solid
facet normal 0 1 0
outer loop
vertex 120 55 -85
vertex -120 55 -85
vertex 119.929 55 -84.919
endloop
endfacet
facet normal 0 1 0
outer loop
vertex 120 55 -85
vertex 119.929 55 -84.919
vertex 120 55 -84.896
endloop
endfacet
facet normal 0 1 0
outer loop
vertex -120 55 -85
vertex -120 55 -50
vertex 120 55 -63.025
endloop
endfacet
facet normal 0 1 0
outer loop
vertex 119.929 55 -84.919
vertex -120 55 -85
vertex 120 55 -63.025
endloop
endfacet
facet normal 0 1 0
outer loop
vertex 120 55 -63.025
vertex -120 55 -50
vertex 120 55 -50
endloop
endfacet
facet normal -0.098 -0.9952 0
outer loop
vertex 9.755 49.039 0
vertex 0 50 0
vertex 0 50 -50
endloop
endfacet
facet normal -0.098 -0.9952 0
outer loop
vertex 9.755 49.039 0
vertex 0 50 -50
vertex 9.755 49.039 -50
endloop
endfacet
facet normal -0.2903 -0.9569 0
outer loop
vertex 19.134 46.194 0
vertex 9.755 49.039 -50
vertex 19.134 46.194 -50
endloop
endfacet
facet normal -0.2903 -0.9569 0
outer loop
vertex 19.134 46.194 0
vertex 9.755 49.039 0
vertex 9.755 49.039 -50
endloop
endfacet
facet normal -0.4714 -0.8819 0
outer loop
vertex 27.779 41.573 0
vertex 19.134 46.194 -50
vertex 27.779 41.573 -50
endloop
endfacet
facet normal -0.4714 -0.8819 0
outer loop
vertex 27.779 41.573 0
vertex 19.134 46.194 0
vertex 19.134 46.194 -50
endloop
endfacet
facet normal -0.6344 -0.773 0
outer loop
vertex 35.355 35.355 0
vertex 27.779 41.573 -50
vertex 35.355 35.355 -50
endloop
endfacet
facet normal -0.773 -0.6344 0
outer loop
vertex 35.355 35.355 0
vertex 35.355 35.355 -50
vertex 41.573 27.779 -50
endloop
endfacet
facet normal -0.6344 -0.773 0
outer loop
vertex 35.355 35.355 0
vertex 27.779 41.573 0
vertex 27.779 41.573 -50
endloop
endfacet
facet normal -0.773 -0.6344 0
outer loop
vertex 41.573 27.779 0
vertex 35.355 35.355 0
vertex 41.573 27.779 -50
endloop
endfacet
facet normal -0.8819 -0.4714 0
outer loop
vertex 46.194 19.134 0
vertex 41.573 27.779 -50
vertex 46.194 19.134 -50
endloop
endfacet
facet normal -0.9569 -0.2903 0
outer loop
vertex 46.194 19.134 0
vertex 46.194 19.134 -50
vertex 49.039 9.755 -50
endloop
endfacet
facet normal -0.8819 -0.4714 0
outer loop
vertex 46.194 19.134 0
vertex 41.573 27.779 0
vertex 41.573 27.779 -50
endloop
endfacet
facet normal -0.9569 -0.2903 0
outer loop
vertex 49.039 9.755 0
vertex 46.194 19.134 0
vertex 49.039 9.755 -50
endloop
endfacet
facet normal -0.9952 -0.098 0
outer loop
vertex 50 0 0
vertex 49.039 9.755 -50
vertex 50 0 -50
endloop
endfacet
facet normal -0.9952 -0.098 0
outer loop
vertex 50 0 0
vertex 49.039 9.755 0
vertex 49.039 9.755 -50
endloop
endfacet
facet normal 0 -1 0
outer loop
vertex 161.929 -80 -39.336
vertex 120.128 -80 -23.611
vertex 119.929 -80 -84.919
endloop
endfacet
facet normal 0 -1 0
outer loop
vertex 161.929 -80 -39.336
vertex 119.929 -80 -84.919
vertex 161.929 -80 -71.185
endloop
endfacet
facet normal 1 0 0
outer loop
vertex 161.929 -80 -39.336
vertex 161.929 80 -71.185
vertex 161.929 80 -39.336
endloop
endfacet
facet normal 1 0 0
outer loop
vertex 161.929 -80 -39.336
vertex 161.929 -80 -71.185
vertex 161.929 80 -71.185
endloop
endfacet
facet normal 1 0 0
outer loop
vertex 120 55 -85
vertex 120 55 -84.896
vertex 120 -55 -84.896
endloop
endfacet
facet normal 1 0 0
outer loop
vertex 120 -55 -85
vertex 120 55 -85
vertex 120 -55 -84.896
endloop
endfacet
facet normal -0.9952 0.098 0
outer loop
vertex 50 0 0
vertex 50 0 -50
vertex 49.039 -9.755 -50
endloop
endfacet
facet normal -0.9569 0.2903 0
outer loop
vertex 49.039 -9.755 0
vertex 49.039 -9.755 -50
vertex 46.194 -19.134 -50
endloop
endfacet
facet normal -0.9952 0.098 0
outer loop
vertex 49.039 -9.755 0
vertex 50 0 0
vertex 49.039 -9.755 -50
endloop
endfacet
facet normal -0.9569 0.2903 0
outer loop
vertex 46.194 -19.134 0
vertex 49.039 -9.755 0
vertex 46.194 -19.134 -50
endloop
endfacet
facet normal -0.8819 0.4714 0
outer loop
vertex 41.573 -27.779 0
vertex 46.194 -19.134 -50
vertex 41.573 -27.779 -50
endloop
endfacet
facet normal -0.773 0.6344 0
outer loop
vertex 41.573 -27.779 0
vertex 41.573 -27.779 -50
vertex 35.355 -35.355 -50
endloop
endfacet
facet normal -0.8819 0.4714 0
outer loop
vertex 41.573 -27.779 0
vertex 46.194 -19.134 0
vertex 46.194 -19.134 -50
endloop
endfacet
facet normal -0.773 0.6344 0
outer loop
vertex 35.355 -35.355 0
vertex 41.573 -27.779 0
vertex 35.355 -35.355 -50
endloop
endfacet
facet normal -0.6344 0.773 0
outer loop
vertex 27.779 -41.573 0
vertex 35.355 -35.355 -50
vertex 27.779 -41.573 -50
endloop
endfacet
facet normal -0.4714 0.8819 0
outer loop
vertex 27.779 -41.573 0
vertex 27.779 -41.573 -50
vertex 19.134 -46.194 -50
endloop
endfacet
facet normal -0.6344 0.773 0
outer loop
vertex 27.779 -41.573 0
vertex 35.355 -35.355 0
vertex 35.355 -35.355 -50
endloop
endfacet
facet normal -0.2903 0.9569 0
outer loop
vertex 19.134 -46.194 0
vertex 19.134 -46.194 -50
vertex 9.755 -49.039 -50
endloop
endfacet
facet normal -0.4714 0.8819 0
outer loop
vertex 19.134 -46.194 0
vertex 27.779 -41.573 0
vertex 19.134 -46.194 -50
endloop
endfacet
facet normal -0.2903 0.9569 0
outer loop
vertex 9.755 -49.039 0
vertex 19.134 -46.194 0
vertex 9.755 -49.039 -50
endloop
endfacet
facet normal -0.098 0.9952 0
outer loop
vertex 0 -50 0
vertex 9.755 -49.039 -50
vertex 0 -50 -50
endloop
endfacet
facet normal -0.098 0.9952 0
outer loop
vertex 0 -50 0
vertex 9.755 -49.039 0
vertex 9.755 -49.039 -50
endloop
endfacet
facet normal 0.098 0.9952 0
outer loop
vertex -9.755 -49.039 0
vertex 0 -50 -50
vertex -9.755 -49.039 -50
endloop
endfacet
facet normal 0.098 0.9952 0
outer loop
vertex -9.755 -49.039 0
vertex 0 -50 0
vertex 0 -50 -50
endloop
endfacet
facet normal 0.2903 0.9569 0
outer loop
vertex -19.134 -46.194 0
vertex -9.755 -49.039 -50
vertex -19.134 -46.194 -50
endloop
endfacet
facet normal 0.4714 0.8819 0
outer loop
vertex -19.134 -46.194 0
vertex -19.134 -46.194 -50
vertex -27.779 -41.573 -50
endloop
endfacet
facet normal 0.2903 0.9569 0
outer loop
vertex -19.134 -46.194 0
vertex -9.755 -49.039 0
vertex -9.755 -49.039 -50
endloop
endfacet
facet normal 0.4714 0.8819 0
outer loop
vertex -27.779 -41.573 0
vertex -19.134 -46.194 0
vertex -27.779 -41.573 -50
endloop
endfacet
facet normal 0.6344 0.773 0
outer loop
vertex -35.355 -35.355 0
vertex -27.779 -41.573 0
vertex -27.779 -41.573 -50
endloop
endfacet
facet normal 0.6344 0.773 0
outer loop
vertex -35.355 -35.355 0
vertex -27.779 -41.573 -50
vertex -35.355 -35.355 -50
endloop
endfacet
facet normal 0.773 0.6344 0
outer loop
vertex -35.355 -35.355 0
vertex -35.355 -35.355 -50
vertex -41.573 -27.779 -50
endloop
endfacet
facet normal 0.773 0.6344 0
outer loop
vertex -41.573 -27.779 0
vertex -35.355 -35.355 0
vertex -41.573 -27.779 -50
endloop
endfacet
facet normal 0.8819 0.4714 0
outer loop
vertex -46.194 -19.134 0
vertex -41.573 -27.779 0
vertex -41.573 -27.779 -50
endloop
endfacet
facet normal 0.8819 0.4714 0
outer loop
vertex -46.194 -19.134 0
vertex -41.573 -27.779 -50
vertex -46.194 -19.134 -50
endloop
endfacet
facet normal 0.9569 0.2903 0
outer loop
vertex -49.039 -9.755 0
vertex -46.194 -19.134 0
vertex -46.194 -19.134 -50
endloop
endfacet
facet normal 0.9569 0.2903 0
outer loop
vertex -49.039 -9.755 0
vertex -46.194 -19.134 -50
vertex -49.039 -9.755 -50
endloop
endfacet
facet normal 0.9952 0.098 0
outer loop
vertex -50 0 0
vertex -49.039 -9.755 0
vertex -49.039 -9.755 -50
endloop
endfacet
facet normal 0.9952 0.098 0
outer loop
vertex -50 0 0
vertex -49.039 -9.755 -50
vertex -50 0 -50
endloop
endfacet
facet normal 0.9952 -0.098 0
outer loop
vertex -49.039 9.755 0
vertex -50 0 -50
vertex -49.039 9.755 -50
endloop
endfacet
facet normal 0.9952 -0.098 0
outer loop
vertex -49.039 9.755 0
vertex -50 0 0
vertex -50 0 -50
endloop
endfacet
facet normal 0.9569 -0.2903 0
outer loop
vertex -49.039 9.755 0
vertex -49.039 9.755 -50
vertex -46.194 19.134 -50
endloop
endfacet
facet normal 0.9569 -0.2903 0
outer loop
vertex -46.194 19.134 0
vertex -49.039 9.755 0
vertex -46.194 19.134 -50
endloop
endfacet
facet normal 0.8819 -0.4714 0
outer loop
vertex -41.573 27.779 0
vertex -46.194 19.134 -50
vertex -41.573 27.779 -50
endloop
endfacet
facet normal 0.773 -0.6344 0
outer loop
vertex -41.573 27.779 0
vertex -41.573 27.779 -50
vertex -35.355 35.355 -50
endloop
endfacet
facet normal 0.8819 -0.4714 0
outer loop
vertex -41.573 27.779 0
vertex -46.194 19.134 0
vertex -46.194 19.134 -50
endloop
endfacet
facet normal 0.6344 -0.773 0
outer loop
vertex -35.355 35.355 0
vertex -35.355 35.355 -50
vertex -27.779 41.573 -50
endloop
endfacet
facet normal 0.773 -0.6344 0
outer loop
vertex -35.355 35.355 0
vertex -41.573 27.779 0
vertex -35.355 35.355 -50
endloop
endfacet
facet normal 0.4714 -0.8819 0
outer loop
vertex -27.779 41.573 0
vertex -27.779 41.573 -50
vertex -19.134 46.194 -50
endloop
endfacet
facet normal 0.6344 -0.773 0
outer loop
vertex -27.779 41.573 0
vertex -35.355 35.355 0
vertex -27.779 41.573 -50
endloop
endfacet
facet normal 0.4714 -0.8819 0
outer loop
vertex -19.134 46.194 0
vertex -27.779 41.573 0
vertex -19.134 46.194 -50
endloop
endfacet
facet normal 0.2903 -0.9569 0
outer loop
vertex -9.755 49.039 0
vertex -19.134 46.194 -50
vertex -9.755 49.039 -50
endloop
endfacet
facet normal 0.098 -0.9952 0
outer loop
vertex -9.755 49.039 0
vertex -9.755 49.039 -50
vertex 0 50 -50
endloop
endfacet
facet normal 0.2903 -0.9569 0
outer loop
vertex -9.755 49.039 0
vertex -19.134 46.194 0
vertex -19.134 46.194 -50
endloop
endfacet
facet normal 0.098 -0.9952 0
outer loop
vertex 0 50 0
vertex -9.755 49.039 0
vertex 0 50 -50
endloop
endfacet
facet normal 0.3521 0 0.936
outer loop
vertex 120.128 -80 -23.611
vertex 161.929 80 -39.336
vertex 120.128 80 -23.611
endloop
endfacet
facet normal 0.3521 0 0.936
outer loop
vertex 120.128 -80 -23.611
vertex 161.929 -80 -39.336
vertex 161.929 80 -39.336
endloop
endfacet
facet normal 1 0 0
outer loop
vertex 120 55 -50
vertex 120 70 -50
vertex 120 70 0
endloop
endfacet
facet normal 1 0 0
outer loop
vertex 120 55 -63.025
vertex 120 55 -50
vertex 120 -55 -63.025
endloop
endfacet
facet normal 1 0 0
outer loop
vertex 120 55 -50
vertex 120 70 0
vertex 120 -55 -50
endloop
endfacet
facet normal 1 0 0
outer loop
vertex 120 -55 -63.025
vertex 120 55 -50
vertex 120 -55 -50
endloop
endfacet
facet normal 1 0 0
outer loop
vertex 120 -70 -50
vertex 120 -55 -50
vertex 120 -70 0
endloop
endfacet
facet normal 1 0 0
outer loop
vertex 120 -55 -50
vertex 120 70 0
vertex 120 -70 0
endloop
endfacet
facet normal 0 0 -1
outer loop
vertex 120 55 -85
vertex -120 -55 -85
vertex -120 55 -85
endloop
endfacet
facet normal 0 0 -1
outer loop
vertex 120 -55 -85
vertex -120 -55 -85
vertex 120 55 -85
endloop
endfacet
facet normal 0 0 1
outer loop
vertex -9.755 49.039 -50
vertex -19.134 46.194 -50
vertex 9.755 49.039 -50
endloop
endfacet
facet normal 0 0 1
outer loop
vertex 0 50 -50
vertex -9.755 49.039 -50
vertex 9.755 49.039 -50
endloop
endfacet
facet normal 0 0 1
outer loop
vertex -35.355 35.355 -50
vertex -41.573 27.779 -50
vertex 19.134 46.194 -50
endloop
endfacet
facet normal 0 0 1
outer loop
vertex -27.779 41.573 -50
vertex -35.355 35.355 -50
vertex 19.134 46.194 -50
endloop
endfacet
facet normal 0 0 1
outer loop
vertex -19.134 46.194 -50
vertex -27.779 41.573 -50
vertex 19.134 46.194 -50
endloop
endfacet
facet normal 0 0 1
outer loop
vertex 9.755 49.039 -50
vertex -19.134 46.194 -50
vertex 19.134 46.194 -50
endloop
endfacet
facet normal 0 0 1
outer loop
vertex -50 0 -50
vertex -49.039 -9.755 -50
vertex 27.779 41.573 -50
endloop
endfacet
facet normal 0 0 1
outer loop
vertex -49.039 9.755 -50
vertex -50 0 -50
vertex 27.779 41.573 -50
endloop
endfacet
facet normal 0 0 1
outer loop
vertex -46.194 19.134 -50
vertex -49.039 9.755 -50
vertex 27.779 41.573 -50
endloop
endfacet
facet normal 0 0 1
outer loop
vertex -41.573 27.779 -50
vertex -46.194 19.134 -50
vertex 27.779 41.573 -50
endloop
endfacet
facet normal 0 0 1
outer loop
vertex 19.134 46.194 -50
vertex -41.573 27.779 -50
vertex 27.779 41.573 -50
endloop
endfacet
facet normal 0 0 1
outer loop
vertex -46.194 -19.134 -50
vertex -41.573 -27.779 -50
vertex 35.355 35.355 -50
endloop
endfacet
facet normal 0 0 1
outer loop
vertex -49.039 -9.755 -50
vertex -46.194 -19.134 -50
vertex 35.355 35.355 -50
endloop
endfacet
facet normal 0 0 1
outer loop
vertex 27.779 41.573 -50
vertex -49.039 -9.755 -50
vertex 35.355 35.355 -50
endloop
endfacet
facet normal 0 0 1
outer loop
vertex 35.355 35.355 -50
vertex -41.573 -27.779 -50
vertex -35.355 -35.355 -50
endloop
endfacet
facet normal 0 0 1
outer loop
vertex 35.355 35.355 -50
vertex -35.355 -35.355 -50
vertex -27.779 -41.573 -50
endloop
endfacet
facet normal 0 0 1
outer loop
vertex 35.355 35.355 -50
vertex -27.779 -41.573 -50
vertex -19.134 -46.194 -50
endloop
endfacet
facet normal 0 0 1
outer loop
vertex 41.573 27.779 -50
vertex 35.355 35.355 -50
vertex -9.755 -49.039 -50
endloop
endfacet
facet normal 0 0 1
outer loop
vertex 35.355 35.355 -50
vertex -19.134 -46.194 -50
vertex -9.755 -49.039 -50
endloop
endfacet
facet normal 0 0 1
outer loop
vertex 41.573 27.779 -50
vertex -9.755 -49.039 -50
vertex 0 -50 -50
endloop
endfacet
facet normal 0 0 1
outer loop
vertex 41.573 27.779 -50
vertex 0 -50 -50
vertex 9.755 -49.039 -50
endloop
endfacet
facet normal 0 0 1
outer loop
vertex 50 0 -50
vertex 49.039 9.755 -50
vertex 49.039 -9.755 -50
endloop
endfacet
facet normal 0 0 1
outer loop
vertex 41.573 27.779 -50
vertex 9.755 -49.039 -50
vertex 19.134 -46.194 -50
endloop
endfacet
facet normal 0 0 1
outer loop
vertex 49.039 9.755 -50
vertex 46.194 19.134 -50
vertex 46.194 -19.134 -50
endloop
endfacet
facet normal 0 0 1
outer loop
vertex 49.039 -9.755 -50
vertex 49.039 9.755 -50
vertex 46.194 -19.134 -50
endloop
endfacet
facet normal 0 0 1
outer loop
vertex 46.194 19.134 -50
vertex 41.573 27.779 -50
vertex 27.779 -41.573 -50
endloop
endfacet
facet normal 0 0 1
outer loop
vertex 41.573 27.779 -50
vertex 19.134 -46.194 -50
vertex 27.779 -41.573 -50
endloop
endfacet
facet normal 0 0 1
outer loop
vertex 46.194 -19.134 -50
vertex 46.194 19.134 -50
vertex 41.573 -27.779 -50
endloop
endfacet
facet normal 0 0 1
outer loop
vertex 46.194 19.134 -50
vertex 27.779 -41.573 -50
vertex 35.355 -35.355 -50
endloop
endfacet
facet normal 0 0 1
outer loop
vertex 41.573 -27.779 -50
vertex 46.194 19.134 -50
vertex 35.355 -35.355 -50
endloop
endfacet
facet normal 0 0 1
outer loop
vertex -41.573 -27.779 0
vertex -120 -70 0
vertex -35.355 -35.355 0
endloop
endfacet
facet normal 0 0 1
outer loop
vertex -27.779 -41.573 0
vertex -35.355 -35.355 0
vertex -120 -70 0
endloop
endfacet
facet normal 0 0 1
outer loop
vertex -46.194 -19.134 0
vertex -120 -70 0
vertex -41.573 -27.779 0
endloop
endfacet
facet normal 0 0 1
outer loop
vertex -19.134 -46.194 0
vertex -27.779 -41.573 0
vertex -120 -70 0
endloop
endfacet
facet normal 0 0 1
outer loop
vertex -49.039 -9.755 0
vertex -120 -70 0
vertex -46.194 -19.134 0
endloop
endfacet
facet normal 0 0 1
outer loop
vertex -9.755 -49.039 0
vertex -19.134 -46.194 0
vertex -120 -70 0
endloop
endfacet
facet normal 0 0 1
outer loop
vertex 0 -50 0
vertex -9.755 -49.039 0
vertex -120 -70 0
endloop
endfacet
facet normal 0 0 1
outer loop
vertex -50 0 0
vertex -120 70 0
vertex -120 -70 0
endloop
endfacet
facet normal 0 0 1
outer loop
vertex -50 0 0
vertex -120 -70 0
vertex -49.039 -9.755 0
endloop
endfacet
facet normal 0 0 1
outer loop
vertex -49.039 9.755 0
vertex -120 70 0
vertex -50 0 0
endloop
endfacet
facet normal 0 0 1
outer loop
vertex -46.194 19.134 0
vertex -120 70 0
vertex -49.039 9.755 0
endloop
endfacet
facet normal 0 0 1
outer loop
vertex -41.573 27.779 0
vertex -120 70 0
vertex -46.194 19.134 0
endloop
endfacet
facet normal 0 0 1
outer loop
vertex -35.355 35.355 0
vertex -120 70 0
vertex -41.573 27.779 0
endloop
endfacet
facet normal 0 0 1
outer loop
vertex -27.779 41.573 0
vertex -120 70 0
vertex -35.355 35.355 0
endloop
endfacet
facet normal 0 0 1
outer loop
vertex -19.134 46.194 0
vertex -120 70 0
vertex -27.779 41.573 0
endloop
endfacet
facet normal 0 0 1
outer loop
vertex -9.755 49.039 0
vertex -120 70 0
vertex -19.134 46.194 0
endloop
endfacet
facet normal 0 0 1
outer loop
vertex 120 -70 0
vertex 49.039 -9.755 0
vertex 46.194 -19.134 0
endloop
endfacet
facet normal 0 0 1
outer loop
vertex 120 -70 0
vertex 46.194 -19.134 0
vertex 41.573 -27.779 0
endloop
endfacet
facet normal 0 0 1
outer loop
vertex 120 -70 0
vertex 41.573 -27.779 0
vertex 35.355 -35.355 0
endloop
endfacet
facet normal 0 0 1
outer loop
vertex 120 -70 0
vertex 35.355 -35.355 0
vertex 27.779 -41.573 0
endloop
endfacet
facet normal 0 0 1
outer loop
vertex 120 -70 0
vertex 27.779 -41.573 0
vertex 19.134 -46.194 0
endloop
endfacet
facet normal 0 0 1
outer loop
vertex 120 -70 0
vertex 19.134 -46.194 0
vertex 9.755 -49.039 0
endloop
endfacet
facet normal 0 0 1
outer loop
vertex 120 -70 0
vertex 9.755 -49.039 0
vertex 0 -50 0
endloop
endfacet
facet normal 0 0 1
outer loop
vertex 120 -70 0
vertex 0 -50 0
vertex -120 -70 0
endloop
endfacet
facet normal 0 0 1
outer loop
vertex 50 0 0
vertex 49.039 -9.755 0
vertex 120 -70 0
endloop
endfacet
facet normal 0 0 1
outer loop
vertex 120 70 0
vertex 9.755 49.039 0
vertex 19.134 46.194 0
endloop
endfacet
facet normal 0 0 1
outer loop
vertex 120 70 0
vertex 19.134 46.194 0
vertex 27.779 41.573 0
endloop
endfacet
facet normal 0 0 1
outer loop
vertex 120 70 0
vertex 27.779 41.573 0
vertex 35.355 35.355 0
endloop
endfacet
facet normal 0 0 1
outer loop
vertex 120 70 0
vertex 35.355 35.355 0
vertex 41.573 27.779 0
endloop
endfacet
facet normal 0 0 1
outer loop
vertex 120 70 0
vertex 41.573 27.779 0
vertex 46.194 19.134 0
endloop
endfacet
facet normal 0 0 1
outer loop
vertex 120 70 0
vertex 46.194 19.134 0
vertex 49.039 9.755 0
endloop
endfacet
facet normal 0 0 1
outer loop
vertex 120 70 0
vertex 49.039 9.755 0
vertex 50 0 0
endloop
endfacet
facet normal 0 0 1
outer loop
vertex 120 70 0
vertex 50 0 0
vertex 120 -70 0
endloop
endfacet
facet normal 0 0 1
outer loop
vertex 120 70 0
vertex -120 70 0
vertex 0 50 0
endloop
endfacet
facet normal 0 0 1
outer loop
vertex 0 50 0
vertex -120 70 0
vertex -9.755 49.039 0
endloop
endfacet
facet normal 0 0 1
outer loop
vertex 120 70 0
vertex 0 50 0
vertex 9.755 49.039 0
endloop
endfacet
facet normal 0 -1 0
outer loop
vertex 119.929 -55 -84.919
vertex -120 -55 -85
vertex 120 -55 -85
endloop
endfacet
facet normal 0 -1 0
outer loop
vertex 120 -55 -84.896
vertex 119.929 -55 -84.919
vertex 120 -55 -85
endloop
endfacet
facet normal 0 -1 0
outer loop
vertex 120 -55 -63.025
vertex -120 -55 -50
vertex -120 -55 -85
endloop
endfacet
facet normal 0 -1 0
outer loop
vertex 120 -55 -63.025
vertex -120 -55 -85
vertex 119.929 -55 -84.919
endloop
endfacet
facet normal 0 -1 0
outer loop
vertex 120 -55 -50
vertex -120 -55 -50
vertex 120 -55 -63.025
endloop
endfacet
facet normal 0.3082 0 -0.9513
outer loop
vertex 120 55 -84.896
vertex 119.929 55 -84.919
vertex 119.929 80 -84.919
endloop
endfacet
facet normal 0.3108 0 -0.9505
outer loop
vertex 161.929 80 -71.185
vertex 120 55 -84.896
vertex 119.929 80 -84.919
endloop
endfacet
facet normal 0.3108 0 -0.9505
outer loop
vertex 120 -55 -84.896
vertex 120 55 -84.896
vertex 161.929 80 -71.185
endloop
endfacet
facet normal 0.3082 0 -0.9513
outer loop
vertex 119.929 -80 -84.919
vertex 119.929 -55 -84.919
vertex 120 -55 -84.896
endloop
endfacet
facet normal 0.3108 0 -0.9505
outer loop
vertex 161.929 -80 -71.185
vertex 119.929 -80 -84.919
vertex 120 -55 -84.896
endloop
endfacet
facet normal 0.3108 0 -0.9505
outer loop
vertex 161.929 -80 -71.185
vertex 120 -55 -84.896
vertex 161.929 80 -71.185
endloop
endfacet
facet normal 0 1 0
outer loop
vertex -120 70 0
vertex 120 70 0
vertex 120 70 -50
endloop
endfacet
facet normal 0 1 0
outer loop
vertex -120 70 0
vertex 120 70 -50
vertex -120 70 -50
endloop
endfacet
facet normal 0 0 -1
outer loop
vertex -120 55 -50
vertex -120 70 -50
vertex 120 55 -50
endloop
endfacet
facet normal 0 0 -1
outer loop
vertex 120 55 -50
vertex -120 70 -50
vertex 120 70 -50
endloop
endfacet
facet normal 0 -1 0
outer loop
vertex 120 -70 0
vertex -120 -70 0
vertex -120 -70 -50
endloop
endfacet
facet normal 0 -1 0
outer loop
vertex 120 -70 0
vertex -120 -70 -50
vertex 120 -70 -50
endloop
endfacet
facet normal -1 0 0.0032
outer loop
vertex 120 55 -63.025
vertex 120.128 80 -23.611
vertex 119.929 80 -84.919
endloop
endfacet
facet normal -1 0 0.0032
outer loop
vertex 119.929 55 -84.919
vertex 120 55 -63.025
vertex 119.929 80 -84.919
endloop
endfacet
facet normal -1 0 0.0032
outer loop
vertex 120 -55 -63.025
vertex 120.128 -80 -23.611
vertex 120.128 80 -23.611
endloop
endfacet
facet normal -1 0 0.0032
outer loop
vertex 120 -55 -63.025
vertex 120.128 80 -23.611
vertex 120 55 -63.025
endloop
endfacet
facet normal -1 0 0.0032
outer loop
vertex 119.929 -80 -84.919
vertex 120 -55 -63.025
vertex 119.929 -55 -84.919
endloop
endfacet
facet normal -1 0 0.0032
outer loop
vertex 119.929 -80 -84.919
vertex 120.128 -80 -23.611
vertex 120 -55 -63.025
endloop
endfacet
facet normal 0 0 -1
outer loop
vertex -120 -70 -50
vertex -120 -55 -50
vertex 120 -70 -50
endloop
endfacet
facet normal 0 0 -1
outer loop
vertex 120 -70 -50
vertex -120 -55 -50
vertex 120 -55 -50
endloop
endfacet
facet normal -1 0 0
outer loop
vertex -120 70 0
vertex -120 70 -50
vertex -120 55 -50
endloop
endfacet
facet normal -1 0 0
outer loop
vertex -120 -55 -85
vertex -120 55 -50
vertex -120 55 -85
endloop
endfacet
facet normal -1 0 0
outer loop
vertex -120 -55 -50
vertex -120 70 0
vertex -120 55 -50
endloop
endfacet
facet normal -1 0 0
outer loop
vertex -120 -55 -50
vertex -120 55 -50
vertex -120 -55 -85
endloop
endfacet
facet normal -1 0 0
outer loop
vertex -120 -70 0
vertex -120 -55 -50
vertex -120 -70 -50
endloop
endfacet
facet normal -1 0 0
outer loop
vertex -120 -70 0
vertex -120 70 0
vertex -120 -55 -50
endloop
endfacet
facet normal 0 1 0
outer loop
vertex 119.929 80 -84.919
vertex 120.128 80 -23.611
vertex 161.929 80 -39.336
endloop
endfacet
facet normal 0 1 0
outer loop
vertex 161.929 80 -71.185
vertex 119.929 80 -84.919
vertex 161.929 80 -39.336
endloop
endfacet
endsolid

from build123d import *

# Parameters (mm, degrees)
F1_DEPTH = 50
F2_W     = 240
F2_H     = 110
F2_R     = 50
F3_DEPTH = 35
F5_DEPTH = 80


with BuildPart() as f1:
    # F0 (on Top) → F1 (new body)
    with BuildSketch(Plane.XY):
        Polygon((120, 70), (0, 70), (-120, 70), (-120, -70), (120, -70), align=None)
        with BuildLine():
            ThreePointArc((0, 50), (35.3553390593, 35.3553390593), (50, 0))
            ThreePointArc((50, 0), (-35.3553390593, -35.3553390593), (0, 50))
        make_face(mode=Mode.SUBTRACT)
    extrude(amount=-F1_DEPTH)

    # F2 (on face) → F3 (join)
    with BuildSketch(Plane(origin=(0, 0, -50), x_dir=(1, 0, 0), z_dir=(0, 0, -1))):
        Rectangle(F2_W, F2_H)
        Circle(F2_R, mode=Mode.SUBTRACT)
        Circle(F2_R)
    extrude(amount=F3_DEPTH)

    # F4 (on Front) → F5 (join, symmetric)
    with BuildSketch(Plane.XZ):
        Polygon((161.9289219379, -39.3364913762), (120.1279684901, -23.6113723367), (119.9289113283, -84.9194303155), (161.9289219379, -71.184836328), align=None)
    extrude(amount=F5_DEPTH, both=True)


solid = f1.part
